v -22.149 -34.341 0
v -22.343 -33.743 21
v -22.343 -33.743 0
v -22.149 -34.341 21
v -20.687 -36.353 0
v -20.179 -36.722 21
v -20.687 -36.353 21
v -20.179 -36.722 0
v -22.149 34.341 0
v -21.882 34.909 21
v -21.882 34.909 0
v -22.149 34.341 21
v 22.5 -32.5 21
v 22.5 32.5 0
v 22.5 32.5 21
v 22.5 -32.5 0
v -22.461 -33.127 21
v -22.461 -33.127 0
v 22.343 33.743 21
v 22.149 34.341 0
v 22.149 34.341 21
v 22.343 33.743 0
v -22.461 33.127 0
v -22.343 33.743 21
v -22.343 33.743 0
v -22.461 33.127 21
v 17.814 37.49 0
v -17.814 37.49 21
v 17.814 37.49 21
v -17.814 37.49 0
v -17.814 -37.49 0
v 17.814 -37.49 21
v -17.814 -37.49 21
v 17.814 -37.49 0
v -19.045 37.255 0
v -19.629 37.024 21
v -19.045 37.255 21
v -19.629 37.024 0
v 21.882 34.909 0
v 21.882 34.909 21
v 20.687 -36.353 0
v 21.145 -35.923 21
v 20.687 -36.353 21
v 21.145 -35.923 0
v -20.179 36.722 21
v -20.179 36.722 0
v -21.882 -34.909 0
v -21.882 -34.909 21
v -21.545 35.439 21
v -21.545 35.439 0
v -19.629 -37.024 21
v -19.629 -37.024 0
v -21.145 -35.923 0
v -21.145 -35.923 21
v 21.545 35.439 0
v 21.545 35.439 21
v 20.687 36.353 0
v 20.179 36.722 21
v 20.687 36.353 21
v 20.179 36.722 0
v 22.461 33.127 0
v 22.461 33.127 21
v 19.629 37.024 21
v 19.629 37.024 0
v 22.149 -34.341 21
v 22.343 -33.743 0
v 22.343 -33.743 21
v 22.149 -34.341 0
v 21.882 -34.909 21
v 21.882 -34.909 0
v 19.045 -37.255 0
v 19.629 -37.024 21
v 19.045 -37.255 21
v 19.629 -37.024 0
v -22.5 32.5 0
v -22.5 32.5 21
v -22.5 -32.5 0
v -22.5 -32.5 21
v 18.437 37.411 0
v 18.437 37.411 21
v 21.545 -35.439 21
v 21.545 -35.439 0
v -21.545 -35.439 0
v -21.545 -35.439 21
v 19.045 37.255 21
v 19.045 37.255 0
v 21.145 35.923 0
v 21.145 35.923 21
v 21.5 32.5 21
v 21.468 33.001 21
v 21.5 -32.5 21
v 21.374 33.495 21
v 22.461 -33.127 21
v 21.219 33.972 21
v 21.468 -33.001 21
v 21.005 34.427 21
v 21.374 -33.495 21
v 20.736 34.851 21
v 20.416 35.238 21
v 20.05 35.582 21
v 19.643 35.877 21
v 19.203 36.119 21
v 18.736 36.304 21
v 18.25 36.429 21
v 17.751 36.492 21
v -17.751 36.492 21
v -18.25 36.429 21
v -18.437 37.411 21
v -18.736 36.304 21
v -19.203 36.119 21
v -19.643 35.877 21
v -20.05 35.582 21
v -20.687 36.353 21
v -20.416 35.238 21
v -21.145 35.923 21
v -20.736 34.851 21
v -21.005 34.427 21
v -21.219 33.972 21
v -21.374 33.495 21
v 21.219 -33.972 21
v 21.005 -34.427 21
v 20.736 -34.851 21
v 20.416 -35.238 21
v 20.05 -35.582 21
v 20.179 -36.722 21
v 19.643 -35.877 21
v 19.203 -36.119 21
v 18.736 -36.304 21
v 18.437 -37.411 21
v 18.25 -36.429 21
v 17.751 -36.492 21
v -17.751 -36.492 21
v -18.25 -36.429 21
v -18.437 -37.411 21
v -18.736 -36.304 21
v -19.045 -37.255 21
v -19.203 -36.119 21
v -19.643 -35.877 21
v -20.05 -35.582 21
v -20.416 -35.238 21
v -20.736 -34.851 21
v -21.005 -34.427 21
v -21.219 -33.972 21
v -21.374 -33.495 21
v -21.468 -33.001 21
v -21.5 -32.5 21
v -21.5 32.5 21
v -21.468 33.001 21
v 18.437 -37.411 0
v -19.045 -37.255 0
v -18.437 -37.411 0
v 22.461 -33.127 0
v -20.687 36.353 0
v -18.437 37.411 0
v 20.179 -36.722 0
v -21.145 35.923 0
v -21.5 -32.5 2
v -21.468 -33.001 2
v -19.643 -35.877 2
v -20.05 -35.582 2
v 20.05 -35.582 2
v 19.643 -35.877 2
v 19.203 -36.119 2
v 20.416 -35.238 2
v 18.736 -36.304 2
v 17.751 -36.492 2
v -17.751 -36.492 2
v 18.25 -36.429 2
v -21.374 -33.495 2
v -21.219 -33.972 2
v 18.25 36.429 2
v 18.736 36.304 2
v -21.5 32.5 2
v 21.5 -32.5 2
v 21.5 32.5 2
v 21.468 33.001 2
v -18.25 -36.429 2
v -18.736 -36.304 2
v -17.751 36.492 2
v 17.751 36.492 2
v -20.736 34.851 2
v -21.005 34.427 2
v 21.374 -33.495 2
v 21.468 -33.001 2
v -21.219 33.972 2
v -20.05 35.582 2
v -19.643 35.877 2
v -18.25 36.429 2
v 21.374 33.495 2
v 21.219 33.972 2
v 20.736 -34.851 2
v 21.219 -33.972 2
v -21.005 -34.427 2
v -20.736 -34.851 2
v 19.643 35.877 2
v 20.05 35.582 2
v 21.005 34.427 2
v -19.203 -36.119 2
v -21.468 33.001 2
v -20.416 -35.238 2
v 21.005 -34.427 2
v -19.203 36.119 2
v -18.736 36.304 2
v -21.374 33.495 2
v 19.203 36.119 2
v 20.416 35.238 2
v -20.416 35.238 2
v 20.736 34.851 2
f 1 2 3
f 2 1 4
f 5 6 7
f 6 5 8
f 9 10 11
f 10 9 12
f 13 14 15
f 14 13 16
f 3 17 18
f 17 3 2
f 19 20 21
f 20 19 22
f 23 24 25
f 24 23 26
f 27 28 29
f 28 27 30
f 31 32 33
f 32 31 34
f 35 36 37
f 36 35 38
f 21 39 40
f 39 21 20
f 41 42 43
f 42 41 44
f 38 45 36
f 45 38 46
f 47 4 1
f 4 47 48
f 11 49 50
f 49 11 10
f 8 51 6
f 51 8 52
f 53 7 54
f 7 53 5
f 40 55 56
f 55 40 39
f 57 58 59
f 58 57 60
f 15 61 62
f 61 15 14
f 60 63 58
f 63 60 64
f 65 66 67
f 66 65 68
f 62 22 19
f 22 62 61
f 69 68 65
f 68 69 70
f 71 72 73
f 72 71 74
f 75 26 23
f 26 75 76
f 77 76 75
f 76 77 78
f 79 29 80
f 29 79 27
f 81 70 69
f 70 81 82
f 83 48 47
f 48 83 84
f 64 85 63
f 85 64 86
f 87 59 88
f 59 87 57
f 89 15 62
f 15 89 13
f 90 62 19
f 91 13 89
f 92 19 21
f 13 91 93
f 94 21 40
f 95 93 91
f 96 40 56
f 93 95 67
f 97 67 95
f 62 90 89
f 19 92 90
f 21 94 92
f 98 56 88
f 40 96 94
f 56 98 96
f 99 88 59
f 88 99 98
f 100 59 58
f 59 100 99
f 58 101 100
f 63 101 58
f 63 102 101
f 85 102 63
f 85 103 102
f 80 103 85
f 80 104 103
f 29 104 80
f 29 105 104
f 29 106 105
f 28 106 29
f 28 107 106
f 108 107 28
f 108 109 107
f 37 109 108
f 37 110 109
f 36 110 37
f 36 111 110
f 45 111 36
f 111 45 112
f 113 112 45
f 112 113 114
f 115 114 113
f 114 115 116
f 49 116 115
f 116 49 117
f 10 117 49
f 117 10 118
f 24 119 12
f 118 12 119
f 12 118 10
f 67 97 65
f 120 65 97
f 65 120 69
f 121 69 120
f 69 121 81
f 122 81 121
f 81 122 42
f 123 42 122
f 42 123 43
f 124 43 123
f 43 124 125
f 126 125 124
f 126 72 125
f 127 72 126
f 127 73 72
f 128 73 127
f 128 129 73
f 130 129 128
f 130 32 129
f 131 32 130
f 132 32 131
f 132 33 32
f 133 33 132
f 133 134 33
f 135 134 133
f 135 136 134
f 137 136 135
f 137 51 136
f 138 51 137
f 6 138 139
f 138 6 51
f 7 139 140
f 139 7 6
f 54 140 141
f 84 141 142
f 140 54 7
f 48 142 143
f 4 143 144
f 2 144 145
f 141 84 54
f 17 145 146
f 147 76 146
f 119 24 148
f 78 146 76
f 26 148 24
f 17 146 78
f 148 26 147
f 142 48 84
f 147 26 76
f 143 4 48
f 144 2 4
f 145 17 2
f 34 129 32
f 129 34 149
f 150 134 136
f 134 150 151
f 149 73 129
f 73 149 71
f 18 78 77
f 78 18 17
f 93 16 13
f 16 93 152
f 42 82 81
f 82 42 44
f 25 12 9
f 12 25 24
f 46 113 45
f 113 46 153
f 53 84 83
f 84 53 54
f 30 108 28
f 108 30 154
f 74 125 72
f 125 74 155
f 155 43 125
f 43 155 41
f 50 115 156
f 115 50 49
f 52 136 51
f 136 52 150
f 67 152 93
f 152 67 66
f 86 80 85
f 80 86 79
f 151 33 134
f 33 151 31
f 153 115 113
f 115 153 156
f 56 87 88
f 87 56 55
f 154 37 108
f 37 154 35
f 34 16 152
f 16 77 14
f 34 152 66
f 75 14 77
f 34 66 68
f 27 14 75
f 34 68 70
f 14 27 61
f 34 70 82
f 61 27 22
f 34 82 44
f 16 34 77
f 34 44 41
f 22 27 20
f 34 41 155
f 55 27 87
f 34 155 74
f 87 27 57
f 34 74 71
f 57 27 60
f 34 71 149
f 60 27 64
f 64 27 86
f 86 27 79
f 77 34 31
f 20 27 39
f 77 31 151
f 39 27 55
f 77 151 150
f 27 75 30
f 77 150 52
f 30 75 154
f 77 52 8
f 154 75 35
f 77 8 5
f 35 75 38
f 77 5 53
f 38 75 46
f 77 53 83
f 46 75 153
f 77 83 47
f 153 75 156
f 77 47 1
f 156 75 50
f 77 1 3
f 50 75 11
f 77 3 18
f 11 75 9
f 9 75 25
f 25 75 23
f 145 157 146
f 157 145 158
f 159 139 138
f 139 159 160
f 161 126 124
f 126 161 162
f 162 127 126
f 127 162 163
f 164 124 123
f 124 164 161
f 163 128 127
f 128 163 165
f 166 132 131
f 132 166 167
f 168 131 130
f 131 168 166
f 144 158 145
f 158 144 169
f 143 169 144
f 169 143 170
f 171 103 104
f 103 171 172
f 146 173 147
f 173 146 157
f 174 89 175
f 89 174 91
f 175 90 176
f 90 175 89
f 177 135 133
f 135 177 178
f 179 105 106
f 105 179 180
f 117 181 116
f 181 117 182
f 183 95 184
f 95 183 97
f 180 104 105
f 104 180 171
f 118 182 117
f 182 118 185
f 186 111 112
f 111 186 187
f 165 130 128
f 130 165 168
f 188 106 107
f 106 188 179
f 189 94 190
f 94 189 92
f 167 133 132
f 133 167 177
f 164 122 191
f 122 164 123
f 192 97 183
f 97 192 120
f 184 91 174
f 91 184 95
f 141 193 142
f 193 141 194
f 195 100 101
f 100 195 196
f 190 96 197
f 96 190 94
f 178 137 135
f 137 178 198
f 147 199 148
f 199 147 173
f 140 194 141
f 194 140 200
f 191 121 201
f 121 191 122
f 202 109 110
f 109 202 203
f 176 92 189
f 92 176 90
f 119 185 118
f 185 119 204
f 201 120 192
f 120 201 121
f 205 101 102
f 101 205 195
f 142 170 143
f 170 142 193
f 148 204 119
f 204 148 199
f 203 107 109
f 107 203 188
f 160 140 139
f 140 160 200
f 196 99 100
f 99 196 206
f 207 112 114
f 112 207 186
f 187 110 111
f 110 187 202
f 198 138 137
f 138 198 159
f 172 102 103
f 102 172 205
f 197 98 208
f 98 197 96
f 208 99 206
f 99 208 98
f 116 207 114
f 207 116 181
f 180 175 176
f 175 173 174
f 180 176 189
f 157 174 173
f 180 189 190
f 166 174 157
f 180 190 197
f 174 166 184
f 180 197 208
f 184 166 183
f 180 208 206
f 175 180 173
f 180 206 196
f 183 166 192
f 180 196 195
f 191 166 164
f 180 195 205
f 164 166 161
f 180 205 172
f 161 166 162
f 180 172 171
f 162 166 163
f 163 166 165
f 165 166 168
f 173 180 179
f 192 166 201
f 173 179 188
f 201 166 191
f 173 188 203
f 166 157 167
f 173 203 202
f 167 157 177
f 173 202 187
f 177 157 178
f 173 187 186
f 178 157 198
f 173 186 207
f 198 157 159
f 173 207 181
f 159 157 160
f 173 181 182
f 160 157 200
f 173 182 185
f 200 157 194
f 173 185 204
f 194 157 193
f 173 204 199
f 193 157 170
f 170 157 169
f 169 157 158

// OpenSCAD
$fn = 50;


difference() {
	union() {
		hull() {
			translate(v = [-17.5000000000, 32.5000000000, 0]) {
				cylinder(h = 21, r = 5);
			}
			translate(v = [17.5000000000, 32.5000000000, 0]) {
				cylinder(h = 21, r = 5);
			}
			translate(v = [-17.5000000000, -32.5000000000, 0]) {
				cylinder(h = 21, r = 5);
			}
			translate(v = [17.5000000000, -32.5000000000, 0]) {
				cylinder(h = 21, r = 5);
			}
		}
	}
	union() {
		translate(v = [0, 0, 2]) {
			hull() {
				translate(v = [-17.5000000000, 32.5000000000, 0]) {
					cylinder(h = 19, r = 4);
				}
				translate(v = [17.5000000000, 32.5000000000, 0]) {
					cylinder(h = 19, r = 4);
				}
				translate(v = [-17.5000000000, -32.5000000000, 0]) {
					cylinder(h = 19, r = 4);
				}
				translate(v = [17.5000000000, -32.5000000000, 0]) {
					cylinder(h = 19, r = 4);
				}
			}
		}
	}
}
